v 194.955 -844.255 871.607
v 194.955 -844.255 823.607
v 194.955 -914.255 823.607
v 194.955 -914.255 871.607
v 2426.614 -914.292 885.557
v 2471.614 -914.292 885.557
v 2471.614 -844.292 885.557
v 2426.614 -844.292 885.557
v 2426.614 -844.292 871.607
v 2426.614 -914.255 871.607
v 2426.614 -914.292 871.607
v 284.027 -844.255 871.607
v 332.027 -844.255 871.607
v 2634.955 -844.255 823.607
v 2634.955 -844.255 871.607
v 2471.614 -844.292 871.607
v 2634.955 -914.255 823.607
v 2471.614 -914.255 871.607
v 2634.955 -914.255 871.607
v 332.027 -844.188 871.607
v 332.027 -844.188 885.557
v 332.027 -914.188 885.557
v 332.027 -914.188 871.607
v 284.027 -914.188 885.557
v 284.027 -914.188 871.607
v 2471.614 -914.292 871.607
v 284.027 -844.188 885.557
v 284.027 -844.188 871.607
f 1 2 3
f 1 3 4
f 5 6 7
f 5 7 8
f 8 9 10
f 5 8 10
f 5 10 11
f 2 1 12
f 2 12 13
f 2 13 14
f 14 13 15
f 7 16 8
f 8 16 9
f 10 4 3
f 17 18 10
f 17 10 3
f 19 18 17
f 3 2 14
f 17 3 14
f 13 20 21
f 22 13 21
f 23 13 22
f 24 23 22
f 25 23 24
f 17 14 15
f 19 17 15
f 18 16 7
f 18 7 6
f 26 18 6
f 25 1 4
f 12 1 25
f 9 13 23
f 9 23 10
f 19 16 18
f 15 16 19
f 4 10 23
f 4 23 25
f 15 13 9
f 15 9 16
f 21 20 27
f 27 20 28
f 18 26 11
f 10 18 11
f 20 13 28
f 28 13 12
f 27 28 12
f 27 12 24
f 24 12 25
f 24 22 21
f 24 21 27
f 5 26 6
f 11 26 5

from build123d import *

# Parameters (mm, degrees)
SKETCH014_W  = 2440
SKETCH014_H  = 48
PAD014_DEPTH = 70
SKETCH019_W  = 45
SKETCH019_H  = 70
PAD019_DEPTH = 13.95
SKETCH020_W  = 48
SKETCH020_H  = 70
PAD020_DEPTH = 13.95


with BuildPart() as part:
    # Sketch014 → Pad014 (new body)
    with BuildSketch(Plane.XZ):
        with Locations((1414.96, 859)):
            Rectangle(SKETCH014_W, SKETCH014_H)
    extrude(amount=PAD014_DEPTH)

    # Sketch019 (on Face1 of Pad014) → Pad019 (join)
    with BuildSketch(Plane(origin=(0, 0, 883), x_dir=(-1, 0, 0), z_dir=(0, 0, 1))):
        with Locations((-2449.118553, 35.037096)):
            Rectangle(SKETCH019_W, SKETCH019_H)
    extrude(amount=PAD019_DEPTH)

    # Sketch020 (on Face1 of Pad019) → Pad020 (join)
    with BuildSketch(Plane(origin=(0, 0, 883), x_dir=(-1, 0, 0), z_dir=(0, 0, 1))):
        with Locations((-308.031693, 34.93343)):
            Rectangle(SKETCH020_W, SKETCH020_H)
    extrude(amount=PAD020_DEPTH)


with BuildPart() as part_1:
    # Body011 placement: moved
    add(part.part.moved(Location((-0.005029, -844.254652, -11.393262))))


solid = part_1.part
